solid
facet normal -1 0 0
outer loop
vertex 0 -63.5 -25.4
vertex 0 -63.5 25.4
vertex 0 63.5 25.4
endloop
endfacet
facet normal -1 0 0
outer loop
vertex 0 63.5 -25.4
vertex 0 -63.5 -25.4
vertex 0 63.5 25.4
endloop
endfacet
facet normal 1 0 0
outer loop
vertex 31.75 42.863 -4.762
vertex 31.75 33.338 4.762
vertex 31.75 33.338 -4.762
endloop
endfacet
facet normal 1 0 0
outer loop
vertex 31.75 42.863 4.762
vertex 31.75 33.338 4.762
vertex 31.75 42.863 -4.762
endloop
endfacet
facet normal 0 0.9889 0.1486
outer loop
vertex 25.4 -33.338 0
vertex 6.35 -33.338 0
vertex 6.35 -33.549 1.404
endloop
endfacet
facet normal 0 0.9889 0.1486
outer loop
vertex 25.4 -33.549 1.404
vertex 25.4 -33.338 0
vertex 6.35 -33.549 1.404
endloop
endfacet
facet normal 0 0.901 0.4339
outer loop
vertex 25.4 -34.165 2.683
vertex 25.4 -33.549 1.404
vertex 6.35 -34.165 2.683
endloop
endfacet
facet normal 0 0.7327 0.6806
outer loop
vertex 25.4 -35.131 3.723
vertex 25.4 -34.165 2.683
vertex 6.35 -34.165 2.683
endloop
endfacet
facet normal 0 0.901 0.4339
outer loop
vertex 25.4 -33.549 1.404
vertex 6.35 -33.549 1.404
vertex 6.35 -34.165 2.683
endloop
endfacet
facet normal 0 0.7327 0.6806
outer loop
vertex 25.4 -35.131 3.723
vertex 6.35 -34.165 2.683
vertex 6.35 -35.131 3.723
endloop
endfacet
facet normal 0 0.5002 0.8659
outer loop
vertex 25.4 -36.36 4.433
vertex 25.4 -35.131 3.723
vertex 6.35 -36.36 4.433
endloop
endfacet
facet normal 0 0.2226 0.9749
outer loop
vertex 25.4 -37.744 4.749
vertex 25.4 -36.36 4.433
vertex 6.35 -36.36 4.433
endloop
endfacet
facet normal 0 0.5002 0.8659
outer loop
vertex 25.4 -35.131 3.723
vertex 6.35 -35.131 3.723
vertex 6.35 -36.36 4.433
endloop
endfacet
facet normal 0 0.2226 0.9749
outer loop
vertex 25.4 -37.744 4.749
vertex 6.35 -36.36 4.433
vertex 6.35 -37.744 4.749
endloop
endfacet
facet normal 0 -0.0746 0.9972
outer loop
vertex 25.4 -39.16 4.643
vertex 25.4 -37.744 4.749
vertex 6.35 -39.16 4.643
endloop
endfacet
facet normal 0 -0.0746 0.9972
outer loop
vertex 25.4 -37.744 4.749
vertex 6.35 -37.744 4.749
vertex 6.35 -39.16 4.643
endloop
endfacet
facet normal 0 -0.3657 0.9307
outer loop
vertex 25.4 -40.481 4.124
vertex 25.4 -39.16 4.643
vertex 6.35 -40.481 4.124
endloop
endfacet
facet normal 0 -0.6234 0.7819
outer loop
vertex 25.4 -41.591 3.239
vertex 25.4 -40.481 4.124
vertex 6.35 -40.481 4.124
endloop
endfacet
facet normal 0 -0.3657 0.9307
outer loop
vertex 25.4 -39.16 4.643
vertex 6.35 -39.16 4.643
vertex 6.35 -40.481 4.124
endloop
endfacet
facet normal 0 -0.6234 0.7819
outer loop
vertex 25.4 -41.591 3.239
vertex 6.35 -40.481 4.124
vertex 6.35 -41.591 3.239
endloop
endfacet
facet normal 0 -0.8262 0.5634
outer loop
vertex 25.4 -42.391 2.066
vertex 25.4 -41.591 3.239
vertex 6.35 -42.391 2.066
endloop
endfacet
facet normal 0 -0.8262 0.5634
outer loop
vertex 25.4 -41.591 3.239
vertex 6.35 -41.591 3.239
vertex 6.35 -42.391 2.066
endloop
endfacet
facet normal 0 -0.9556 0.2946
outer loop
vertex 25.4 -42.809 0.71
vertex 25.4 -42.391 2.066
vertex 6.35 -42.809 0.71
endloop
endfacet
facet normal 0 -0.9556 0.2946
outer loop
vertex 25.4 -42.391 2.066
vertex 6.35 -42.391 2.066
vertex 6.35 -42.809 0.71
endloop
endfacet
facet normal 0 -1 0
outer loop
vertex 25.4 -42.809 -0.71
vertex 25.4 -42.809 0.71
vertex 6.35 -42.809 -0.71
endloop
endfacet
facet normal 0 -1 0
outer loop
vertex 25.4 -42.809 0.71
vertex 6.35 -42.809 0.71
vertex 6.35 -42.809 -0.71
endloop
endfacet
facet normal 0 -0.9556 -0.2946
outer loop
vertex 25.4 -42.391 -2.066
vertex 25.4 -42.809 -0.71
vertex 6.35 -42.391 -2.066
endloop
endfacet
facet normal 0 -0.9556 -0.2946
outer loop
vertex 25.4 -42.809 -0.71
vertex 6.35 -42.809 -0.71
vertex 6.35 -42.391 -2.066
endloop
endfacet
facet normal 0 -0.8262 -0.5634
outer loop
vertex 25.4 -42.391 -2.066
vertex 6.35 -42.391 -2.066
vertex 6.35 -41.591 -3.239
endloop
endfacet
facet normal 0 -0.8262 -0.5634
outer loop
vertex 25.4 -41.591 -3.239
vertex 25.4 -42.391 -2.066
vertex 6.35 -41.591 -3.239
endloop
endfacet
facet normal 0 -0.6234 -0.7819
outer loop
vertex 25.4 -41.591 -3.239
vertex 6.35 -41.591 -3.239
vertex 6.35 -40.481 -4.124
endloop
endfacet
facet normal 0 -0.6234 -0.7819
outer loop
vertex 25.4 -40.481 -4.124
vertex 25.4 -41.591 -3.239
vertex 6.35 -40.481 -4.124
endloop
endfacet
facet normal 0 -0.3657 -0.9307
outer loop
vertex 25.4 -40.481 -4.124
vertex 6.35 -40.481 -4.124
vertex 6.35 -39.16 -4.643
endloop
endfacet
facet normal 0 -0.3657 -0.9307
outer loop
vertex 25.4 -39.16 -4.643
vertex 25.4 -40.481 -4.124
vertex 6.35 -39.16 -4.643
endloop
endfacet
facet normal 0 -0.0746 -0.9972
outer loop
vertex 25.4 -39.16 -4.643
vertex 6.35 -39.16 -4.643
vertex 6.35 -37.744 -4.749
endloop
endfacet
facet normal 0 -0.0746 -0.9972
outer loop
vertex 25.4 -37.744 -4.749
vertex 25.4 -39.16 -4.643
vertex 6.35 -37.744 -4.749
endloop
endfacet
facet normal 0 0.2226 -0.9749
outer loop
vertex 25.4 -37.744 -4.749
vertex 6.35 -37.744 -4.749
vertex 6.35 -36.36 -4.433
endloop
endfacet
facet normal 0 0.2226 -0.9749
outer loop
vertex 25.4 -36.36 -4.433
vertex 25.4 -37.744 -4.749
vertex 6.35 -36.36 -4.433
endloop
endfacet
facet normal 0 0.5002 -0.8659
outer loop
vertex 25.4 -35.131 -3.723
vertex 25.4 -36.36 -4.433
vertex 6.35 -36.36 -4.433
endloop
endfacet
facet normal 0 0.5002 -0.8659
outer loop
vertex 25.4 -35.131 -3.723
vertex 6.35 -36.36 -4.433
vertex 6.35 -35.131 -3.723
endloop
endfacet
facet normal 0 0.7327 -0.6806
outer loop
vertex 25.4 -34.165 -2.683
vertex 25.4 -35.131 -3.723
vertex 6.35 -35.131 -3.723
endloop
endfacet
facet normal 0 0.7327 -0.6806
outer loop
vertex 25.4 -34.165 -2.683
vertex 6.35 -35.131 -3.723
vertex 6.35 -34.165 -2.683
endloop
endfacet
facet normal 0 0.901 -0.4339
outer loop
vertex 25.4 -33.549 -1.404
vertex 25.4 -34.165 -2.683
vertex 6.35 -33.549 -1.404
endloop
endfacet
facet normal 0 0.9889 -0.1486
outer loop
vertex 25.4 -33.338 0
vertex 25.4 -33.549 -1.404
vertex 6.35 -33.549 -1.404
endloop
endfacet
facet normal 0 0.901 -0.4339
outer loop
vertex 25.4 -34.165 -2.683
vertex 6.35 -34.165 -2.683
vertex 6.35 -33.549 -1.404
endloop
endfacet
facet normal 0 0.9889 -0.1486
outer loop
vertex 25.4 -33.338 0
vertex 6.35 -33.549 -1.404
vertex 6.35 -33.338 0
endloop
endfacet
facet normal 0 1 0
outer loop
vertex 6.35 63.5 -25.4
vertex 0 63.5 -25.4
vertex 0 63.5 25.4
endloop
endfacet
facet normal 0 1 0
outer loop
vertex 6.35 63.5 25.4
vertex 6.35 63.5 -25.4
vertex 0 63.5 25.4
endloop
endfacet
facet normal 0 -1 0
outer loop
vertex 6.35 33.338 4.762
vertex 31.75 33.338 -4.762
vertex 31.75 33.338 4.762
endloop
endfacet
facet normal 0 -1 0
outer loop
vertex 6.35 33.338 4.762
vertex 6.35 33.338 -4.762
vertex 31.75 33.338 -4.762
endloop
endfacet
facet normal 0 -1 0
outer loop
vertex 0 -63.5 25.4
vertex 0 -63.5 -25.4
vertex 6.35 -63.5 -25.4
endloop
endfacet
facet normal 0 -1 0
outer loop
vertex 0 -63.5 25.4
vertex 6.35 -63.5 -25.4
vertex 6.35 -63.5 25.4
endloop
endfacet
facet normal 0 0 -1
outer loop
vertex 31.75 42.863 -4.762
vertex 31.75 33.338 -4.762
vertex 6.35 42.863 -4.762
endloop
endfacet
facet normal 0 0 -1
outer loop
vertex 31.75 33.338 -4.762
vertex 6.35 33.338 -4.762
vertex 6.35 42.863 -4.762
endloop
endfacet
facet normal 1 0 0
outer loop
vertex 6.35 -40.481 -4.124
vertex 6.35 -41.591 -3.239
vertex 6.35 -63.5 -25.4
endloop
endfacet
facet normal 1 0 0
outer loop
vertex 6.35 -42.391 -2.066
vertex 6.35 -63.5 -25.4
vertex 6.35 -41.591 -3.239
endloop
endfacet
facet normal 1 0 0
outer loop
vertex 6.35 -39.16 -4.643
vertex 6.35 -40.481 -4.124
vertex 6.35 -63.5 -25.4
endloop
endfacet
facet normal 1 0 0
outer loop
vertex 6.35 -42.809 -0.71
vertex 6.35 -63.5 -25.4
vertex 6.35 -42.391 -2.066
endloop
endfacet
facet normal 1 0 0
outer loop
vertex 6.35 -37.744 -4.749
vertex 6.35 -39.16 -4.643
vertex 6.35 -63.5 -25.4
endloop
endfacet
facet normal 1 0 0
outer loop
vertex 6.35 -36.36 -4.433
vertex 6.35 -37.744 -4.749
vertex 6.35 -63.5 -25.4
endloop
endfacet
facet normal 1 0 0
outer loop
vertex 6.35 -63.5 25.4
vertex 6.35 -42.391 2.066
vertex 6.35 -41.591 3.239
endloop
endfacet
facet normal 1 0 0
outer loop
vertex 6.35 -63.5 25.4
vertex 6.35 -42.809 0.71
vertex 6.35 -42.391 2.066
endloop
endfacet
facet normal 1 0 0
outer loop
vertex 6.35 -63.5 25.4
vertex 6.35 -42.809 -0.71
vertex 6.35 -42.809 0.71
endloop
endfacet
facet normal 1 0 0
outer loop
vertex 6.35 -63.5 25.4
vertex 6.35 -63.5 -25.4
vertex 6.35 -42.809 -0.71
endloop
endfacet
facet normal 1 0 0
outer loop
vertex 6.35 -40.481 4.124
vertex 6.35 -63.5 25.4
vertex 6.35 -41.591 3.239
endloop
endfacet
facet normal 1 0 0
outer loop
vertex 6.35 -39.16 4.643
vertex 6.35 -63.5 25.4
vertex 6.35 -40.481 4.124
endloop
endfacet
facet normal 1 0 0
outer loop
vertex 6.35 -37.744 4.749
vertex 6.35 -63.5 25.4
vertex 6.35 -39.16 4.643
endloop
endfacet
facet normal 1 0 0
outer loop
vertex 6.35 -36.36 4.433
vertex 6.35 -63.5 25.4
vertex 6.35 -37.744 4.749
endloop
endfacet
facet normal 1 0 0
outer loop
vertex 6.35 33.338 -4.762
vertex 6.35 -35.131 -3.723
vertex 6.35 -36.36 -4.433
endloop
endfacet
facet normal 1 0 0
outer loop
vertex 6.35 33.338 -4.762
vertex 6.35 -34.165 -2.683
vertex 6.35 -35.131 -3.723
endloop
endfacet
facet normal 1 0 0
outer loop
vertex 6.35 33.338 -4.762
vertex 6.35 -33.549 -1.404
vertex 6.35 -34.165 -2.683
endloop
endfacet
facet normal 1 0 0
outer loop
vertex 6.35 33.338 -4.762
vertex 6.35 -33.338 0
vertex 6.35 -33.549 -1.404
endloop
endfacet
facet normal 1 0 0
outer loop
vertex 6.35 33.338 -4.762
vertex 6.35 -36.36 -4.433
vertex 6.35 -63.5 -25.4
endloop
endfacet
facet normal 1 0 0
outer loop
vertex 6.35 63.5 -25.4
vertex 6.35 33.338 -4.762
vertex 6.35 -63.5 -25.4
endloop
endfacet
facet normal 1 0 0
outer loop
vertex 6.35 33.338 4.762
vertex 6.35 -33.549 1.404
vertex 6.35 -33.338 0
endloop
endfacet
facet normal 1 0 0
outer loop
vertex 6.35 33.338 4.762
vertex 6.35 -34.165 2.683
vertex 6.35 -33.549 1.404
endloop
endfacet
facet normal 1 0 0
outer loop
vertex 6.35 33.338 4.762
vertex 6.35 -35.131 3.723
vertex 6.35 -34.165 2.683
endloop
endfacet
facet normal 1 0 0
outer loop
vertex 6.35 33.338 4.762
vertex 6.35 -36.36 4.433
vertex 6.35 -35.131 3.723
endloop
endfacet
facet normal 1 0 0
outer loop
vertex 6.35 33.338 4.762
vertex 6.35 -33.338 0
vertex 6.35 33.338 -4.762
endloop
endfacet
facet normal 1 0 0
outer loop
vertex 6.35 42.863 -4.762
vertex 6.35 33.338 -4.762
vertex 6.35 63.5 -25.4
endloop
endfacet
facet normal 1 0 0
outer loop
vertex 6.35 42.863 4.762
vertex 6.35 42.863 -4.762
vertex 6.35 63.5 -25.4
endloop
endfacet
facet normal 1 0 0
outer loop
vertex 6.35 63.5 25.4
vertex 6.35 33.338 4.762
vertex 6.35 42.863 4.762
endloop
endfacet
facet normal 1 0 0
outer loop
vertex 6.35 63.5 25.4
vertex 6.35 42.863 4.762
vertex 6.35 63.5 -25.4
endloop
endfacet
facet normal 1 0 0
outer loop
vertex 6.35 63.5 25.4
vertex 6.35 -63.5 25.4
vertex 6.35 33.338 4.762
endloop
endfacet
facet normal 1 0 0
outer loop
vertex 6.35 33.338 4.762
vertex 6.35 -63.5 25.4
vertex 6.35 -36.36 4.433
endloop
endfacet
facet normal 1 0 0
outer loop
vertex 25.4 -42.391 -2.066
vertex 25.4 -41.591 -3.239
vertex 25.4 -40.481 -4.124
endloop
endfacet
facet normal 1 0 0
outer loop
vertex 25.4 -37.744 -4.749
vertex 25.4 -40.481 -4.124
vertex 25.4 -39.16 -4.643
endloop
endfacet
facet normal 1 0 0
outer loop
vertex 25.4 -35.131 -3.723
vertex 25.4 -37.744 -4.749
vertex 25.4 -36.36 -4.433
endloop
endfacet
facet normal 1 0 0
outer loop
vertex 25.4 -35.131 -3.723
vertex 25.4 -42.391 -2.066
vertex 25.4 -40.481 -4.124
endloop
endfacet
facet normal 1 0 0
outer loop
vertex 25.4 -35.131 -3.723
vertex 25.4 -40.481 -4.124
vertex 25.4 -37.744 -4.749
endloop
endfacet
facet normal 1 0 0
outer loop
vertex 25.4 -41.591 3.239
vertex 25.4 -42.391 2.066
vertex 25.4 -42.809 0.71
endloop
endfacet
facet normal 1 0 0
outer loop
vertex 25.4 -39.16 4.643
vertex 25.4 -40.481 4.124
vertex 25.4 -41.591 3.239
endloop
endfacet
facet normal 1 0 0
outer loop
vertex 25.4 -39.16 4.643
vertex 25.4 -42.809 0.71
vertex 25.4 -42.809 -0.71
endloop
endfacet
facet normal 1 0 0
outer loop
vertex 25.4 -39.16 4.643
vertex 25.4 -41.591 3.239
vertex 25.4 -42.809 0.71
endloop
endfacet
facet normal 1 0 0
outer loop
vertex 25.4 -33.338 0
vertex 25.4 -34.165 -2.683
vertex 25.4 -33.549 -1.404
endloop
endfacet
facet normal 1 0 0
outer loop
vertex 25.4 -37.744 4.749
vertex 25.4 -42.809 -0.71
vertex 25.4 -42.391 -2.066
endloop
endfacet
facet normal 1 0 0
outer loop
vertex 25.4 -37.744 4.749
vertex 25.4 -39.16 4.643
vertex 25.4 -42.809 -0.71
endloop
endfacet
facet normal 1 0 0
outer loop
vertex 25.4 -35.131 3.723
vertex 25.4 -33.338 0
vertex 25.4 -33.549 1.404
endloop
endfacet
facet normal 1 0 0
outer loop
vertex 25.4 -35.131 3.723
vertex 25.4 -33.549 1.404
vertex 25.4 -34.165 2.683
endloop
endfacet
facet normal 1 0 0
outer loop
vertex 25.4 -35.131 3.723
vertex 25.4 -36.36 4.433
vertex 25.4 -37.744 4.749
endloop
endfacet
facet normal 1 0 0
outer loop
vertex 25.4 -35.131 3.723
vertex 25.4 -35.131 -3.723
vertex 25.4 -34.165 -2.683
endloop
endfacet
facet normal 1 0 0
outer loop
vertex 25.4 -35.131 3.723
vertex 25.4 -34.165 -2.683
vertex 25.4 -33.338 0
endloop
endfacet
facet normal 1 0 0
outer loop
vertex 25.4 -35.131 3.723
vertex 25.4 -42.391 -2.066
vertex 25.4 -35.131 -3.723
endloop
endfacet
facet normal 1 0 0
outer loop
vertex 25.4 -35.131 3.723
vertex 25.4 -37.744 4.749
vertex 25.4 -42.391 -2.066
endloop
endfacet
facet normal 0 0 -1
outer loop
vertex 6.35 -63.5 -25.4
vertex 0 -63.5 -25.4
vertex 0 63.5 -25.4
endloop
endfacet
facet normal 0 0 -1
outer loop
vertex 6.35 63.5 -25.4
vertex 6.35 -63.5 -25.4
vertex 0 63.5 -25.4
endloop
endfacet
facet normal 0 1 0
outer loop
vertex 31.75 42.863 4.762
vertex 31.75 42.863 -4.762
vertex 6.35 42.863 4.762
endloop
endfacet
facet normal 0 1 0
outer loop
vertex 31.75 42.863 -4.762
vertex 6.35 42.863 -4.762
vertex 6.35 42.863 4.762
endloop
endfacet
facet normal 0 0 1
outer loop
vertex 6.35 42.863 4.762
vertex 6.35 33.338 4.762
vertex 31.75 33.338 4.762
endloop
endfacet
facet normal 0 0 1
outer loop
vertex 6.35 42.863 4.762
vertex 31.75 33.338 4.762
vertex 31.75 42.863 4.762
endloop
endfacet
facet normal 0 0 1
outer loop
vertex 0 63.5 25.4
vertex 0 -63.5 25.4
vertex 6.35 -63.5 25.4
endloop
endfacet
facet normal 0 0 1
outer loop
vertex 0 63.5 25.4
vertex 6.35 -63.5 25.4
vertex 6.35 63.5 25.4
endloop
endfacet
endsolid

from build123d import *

# Parameters (mm, degrees)
F0_W      = 127
F0_H      = 50.800004
F1_DEPTH  = 6.35
F2_R      = 4.7625
F2_W      = 9.525
F2_H      = 9.525
F3_DEPTH  = 19.05
F3_FACE_W = 9.525
F3_FACE_H = 9.525
F4_DEPTH  = 6.35


with BuildPart() as f1:
    # F0 (on Right) → F1 (new body)
    with BuildSketch(Plane.YZ):
        Rectangle(F0_W, F0_H)
    extrude(amount=F1_DEPTH)

    # F2 (on face) → F3 (join)
    with BuildSketch(Plane.YZ.offset(6.35)):
        with Locations((-38.1, 0)):
            Circle(F2_R)
        with Locations((38.1, 0)):
            Rectangle(F2_W, F2_H)
    extrude(amount=F3_DEPTH)

    # F3_face (on face) → F4 (join)
    with BuildSketch(Plane(origin=(25.4, 38.1, 0), x_dir=(0, 1, 0), z_dir=(1, 0, 0))):
        Rectangle(F3_FACE_W, F3_FACE_H)
    extrude(amount=F4_DEPTH)


solid = f1.part
